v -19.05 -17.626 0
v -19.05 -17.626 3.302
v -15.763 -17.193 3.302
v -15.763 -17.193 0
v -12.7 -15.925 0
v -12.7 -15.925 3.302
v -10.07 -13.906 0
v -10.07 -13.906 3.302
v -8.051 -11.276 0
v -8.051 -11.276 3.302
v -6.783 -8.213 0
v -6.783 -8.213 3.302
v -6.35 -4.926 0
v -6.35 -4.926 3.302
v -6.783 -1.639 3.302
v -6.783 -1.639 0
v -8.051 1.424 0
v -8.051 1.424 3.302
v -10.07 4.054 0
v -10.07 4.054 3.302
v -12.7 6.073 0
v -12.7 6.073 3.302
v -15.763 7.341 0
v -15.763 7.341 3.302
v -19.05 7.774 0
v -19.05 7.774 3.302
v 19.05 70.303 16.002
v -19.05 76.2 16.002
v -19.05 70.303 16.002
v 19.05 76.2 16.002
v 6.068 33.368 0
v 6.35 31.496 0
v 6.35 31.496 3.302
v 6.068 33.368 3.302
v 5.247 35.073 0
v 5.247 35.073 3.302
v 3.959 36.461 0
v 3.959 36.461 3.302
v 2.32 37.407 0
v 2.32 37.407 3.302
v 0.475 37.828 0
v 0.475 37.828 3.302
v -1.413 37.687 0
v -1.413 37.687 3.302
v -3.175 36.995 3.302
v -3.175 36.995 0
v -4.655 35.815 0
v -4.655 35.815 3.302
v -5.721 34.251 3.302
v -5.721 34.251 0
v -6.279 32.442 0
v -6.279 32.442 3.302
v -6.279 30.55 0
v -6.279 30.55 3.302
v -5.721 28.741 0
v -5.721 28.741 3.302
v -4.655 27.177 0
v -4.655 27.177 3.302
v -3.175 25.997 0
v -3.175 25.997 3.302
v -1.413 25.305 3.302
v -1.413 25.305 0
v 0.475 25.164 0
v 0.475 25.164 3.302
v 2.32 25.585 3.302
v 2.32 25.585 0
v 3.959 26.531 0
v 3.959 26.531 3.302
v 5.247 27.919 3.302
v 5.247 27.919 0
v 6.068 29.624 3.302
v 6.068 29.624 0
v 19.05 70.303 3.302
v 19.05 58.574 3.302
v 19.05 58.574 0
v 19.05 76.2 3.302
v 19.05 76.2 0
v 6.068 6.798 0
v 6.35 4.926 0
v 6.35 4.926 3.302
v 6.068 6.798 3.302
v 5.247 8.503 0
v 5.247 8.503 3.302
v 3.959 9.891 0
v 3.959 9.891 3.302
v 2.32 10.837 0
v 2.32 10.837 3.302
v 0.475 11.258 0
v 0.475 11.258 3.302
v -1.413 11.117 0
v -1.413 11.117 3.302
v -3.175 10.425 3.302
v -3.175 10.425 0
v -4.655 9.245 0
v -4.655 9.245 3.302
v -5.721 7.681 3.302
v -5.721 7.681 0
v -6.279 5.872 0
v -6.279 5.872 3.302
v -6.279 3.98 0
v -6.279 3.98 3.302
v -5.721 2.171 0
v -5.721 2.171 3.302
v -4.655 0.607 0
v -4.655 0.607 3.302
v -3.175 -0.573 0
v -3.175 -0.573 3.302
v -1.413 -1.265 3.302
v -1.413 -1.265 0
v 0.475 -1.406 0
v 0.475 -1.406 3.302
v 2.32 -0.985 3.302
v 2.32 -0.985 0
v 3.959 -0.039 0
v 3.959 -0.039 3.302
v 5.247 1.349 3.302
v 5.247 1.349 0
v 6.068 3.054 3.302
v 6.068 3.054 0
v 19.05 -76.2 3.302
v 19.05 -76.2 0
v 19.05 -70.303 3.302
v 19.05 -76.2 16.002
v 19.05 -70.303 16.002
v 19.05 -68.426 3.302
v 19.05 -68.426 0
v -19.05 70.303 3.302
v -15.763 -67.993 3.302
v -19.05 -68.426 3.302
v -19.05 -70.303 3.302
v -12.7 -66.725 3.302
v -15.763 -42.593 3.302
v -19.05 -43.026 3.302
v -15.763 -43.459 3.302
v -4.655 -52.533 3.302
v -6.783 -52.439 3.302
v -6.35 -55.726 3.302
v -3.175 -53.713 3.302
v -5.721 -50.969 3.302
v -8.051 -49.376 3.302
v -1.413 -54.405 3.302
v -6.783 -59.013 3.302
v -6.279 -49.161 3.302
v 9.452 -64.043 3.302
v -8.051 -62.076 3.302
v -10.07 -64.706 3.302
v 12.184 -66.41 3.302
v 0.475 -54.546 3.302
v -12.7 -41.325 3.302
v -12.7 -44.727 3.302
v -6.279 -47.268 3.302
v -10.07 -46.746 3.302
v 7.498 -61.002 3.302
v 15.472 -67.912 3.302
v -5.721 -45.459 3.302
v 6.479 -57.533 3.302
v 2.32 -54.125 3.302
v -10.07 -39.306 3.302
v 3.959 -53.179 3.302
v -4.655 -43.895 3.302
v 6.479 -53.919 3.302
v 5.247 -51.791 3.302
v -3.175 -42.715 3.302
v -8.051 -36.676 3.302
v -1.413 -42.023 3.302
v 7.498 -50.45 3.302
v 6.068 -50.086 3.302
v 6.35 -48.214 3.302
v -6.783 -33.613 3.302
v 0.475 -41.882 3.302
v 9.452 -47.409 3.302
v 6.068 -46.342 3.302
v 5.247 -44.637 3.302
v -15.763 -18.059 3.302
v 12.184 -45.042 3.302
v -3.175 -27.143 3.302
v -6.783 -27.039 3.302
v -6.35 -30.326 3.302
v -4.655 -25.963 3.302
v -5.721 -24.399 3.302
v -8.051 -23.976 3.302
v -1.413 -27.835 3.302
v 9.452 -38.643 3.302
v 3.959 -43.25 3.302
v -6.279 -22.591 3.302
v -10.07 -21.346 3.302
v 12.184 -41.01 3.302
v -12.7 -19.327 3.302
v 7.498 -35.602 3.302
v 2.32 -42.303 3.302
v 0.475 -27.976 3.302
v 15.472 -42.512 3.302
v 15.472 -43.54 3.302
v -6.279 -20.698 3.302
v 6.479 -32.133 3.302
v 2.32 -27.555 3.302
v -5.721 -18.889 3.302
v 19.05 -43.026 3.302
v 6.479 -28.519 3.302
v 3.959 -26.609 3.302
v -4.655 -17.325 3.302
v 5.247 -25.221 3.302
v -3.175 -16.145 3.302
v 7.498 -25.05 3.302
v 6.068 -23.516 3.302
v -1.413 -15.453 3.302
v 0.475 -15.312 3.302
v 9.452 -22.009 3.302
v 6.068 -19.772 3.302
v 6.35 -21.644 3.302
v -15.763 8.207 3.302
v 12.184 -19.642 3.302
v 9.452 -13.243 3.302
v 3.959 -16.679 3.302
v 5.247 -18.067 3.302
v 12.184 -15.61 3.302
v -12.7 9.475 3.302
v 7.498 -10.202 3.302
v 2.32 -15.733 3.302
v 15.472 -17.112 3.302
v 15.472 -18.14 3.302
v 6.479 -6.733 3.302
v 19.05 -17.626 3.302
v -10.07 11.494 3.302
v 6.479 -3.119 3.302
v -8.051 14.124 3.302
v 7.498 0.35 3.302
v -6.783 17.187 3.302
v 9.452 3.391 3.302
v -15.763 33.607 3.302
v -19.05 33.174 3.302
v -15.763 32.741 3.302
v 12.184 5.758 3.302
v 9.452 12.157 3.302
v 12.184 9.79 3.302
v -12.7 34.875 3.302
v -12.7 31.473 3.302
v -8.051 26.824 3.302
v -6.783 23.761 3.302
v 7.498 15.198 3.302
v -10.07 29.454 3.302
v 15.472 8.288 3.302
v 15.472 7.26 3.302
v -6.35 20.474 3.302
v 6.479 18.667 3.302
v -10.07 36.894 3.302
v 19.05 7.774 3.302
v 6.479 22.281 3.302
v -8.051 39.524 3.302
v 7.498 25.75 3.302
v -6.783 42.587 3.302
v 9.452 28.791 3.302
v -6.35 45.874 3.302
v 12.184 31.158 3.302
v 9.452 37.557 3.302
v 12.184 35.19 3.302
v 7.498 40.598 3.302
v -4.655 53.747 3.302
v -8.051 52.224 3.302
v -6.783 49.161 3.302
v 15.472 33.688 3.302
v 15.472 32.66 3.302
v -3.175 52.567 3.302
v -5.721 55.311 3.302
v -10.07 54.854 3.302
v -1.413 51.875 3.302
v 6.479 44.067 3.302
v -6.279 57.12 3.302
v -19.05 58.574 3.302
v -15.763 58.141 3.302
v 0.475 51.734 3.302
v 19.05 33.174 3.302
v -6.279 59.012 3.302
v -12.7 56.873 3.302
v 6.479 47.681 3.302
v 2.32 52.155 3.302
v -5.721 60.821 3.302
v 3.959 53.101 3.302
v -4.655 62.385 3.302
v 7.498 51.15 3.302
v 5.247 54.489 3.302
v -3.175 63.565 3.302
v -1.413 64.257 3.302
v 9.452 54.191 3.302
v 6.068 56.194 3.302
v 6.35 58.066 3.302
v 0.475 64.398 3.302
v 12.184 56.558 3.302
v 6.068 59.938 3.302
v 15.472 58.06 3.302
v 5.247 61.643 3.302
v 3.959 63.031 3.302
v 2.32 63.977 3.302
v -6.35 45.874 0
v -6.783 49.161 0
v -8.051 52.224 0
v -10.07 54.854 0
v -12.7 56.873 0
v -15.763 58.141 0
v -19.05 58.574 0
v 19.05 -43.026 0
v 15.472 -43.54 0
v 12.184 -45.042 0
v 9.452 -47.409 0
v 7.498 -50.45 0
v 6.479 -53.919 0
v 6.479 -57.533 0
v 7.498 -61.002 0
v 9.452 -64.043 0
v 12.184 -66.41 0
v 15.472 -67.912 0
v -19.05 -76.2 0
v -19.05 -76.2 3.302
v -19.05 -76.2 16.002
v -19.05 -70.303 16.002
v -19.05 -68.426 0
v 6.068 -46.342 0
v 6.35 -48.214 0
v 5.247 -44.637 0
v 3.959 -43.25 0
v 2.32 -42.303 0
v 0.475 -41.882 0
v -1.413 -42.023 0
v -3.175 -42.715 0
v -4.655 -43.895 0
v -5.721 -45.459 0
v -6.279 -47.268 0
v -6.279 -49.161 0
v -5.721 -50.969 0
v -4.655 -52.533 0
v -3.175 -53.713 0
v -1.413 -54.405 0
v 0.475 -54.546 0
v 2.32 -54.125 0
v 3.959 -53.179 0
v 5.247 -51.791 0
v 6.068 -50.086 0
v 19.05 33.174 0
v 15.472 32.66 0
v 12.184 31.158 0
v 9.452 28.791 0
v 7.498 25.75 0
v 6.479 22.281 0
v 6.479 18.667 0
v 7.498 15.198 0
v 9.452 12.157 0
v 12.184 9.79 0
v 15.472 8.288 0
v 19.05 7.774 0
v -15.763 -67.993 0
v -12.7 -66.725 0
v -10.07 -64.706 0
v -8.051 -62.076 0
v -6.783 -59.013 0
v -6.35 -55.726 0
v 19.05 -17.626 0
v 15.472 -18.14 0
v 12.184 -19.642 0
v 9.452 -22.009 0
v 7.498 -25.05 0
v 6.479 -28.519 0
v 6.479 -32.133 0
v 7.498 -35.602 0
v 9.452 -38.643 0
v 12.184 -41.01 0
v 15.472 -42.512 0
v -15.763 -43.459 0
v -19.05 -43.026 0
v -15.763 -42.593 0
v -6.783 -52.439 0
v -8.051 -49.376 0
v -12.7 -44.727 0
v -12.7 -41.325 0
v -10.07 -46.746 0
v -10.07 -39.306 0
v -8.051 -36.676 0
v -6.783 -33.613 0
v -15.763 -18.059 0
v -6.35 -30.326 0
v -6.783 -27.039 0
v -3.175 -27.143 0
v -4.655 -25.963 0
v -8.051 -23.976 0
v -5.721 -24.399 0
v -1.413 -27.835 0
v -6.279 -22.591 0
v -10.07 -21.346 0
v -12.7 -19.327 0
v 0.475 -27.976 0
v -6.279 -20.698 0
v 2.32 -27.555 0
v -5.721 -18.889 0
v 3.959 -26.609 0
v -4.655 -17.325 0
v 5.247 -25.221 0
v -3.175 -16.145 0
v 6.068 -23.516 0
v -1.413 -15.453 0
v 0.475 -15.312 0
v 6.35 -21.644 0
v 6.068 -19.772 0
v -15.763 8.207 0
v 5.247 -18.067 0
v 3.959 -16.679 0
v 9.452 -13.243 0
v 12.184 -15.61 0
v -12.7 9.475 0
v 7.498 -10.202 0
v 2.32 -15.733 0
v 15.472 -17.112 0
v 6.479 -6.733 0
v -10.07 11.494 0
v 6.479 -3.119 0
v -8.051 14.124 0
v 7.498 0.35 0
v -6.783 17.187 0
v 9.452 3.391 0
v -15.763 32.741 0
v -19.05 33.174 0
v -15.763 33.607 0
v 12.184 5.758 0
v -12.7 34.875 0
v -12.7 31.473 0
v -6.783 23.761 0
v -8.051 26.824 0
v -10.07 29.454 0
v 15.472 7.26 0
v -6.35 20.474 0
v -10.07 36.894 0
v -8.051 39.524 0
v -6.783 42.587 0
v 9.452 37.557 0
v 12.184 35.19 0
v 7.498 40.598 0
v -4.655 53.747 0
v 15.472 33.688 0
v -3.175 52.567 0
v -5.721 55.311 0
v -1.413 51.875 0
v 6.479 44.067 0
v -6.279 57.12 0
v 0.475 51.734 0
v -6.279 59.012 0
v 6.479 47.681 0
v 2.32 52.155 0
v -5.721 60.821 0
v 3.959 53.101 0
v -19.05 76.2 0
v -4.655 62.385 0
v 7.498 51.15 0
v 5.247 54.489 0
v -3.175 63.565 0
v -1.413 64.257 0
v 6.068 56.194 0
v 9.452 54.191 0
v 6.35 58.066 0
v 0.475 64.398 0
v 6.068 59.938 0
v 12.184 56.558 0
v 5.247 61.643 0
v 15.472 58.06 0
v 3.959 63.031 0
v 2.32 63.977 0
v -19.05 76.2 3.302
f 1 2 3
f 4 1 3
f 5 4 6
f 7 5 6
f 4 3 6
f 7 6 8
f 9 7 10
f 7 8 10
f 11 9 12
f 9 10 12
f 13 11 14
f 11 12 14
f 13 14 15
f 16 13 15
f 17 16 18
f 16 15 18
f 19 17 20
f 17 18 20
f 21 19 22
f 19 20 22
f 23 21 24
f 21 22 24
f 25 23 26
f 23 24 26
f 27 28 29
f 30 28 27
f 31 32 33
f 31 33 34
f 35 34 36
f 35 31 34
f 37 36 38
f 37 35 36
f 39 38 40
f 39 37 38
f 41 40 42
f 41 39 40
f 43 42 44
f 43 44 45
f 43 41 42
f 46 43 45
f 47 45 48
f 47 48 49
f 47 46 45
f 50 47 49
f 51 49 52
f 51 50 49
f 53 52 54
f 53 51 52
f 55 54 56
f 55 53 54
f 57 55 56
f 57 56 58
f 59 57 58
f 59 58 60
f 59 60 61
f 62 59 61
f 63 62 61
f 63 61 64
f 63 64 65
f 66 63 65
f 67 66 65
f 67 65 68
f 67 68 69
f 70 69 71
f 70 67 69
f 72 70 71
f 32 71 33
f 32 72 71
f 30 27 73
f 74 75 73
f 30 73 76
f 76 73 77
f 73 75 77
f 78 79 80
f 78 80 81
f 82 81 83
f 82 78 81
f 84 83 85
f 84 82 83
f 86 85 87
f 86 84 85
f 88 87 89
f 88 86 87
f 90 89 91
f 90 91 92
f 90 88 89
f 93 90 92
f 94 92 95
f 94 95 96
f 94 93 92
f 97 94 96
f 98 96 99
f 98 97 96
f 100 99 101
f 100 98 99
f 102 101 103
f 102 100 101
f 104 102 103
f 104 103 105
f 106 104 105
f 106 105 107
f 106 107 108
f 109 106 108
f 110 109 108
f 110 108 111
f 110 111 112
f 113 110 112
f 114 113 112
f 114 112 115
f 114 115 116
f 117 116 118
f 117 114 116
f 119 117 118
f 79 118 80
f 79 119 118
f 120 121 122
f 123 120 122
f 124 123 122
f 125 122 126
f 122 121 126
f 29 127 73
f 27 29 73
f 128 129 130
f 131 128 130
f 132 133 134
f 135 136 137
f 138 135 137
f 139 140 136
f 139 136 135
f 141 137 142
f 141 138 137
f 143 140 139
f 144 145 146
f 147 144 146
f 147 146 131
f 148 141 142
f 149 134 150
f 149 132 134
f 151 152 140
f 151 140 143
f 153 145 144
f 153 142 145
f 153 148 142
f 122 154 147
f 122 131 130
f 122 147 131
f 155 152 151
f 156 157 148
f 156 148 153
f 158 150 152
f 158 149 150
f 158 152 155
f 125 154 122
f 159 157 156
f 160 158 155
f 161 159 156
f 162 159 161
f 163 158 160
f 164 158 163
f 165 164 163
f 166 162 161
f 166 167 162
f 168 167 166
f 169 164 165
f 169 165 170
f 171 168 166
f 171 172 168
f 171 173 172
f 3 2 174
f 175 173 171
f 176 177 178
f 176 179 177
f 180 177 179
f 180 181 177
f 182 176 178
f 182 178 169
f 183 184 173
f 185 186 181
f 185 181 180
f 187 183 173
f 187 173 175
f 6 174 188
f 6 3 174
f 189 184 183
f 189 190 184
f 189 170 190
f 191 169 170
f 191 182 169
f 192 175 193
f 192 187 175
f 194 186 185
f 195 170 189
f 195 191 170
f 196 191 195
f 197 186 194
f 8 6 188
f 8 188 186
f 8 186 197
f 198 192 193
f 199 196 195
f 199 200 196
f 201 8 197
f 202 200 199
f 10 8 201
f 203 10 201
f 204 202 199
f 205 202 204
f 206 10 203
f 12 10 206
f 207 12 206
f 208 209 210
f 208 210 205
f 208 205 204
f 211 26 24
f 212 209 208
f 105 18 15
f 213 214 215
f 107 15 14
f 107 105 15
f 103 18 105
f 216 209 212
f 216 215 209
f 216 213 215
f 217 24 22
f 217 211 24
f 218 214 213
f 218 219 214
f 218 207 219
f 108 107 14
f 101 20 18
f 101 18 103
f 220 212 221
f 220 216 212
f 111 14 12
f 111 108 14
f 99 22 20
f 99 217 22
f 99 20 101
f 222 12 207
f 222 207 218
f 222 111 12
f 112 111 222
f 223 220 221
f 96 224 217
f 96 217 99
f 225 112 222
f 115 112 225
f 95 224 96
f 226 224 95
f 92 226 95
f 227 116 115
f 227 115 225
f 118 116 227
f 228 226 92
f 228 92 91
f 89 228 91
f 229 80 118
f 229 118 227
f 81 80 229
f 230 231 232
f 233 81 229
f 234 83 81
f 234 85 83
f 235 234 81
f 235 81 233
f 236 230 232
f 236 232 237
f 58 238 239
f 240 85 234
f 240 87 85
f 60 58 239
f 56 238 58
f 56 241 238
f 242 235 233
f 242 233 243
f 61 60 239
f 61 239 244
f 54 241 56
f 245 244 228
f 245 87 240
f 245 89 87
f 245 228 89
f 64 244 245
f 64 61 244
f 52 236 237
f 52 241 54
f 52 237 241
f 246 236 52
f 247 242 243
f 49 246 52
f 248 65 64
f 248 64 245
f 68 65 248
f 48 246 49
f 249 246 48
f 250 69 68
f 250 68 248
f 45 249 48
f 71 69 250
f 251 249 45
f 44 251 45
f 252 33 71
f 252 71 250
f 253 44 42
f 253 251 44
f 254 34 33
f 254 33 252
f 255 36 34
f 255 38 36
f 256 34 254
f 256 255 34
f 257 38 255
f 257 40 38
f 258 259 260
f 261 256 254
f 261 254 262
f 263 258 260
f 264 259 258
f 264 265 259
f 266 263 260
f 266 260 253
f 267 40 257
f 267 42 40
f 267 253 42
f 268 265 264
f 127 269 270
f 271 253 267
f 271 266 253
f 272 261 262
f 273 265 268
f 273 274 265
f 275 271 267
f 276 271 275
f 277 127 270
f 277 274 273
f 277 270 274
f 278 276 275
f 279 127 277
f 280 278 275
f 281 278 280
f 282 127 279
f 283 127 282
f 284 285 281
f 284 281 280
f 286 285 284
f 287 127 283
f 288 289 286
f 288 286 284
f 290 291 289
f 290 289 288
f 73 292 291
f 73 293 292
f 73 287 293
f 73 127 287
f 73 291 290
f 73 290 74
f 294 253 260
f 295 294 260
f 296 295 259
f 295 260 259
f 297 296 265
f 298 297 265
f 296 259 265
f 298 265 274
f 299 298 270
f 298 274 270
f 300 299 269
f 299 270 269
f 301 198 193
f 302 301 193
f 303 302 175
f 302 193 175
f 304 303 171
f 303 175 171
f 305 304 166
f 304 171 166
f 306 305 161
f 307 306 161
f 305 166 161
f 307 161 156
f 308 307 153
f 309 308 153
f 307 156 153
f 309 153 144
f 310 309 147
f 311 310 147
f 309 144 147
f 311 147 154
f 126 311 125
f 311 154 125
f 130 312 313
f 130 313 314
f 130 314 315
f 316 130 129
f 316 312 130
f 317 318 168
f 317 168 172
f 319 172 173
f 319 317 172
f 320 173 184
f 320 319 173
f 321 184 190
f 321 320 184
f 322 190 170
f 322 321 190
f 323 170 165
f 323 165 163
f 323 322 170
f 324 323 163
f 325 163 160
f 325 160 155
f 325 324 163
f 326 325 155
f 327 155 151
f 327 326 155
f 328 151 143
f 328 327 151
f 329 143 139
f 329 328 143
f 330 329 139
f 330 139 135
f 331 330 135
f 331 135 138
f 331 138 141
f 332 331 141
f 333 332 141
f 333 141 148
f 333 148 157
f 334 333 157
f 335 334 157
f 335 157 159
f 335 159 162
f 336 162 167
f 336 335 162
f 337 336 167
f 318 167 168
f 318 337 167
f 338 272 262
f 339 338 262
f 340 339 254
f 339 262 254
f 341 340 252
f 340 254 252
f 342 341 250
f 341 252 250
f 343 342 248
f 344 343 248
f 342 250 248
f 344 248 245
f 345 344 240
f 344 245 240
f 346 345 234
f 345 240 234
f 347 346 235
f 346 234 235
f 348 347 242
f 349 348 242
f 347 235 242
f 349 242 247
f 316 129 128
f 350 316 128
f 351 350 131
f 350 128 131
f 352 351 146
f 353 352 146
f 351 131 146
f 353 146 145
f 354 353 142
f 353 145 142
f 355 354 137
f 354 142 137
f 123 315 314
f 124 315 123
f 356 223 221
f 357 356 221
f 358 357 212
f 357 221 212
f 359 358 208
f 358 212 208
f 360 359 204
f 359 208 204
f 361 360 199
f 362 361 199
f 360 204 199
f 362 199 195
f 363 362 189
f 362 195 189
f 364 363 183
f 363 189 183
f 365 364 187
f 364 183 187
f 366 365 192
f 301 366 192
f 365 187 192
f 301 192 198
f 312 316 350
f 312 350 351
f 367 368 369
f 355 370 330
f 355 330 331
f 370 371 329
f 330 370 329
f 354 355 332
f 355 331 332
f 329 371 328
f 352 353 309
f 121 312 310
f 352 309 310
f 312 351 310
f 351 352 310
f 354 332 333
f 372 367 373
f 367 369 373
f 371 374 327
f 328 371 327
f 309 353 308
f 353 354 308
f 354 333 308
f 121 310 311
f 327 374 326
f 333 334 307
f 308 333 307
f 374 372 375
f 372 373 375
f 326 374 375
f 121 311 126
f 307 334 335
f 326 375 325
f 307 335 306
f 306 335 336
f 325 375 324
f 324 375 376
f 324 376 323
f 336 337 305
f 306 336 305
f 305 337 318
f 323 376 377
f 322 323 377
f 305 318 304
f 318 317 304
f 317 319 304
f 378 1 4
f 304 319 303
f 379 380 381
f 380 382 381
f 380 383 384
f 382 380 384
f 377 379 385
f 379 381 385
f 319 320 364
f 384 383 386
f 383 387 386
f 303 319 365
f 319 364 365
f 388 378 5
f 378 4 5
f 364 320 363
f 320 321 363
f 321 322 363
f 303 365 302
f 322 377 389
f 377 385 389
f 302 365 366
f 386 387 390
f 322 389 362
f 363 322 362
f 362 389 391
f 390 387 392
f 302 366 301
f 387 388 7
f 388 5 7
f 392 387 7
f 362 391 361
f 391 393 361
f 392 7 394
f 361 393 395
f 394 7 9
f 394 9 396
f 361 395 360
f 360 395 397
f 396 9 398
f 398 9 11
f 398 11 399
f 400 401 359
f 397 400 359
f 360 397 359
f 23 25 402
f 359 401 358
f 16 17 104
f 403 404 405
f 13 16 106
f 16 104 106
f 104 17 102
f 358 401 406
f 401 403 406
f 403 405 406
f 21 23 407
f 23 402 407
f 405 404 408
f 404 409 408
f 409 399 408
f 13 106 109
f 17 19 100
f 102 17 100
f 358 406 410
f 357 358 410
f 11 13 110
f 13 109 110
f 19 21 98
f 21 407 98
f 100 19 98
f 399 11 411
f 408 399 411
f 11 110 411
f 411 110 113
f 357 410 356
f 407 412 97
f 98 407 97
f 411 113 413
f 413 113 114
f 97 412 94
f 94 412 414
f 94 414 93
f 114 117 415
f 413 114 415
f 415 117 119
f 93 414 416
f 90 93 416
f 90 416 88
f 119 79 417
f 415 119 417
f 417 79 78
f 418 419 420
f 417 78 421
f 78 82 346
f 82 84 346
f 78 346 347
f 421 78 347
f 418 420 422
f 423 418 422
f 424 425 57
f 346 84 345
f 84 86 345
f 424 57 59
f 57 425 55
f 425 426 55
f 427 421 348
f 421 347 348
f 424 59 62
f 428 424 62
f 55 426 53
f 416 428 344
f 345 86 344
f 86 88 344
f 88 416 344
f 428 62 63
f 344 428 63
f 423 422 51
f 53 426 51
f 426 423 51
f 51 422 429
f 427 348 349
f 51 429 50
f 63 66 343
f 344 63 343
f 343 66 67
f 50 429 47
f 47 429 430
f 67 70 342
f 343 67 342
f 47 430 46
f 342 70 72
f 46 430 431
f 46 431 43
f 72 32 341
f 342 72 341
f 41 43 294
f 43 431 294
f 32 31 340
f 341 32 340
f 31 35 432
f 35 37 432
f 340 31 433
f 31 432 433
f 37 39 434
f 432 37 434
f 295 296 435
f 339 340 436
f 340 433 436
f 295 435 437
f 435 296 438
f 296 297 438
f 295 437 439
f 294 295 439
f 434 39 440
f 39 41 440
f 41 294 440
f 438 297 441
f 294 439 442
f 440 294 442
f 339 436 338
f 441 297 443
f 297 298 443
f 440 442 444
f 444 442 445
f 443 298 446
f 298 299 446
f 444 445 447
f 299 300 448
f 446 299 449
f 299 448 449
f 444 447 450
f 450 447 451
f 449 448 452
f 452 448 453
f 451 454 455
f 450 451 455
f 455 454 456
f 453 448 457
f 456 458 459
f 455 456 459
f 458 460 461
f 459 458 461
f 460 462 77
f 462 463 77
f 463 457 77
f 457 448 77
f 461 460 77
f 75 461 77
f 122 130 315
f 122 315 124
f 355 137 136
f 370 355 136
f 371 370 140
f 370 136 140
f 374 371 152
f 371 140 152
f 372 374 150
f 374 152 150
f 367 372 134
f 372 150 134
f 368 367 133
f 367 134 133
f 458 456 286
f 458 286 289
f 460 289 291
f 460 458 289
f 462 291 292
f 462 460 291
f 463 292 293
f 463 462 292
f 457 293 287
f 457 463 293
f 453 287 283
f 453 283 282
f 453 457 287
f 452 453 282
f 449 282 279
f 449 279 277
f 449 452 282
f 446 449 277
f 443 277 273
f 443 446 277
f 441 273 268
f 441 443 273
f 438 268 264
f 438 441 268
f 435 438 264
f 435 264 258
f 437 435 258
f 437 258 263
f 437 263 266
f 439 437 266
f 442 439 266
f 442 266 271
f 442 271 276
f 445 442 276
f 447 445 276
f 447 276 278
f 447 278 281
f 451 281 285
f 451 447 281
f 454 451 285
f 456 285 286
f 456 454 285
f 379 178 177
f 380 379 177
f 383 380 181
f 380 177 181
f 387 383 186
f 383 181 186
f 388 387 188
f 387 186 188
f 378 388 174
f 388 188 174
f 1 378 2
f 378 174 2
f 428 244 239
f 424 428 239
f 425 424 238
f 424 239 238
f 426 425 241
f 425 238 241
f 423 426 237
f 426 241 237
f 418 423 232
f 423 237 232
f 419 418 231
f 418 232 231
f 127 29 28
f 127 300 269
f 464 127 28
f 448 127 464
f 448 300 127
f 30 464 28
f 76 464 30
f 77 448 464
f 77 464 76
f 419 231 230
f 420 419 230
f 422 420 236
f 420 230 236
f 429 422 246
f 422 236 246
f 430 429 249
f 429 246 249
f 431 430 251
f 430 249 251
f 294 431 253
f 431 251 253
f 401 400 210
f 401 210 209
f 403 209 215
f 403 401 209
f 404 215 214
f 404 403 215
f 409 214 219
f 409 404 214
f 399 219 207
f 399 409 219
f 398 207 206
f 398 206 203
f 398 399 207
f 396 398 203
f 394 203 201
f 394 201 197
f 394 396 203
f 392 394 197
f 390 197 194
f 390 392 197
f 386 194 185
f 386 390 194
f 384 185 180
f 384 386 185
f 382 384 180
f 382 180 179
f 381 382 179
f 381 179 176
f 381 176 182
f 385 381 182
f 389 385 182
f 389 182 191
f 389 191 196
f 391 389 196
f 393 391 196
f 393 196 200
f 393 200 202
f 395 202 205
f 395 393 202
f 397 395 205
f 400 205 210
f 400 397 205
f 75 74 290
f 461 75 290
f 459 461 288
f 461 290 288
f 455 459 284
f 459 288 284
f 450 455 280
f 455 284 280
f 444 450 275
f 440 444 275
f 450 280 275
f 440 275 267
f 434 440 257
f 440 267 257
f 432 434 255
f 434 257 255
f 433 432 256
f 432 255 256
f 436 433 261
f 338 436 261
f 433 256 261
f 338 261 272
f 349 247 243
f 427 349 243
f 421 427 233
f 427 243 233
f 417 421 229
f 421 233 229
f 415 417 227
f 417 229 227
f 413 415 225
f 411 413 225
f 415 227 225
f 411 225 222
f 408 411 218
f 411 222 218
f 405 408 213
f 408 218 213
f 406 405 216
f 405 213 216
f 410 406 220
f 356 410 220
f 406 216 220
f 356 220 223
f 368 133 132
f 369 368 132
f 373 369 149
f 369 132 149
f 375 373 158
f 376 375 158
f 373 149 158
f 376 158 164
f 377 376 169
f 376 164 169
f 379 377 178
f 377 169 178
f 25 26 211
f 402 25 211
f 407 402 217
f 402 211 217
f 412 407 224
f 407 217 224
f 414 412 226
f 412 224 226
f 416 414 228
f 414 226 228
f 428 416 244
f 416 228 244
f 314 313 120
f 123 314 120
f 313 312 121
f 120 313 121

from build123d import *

# Parameters (mm, degrees)
F0_W     = 38.1
F0_H     = 152.4
F0_R     = 6.35
F1_DEPTH = 3.302
F2_W     = 38.1
F2_H     = 5.8965822577
F3_DEPTH = 12.7
F5_DEPTH = 25.4


with BuildPart() as f1:
    # F0 (on Top) → F1 (new body)
    with BuildSketch(Plane.XY):
        Rectangle(F0_W, F0_H)
        with Locations((0, -48.2141543601)):
            Circle(F0_R, mode=Mode.SUBTRACT)
        with Locations((0, -21.6441029067)):
            Circle(F0_R, mode=Mode.SUBTRACT)
        with Locations((0, 4.9259485466)):
            Circle(F0_R, mode=Mode.SUBTRACT)
        with Locations((0, 31.496)):
            Circle(F0_R, mode=Mode.SUBTRACT)
        with Locations((0, 58.0660514534)):
            Circle(F0_R, mode=Mode.SUBTRACT)
    extrude(amount=F1_DEPTH)

    # F2 (on face) → F3 (join)
    with BuildSketch(Plane.XY.offset(3.302)):
        with Locations((0, 73.2517088711)):
            Rectangle(F2_W, F2_H)
        with Locations((0, -73.2517088711)):
            Rectangle(F2_W, F2_H)
    extrude(amount=F3_DEPTH)

    # F4 (on face) → F5 (cut)
    with BuildSketch(Plane.XY.offset(3.302)):
        with BuildLine():
            ThreePointArc((-19.05, 33.1740033209), (-10.0697438789, 36.8937471999), (-6.35, 45.8740033209))
            ThreePointArc((-6.35, 45.8740033209), (-10.0697438789, 54.854259442), (-19.05, 58.5740033209))
            Line((-19.05, 58.5740033209), (-19.05, 33.1740033209))
        make_face()
        with BuildLine():
            ThreePointArc((-6.35, 20.4740033209), (-10.0697438789, 29.454259442), (-19.05, 33.1740033209))
            Line((-19.05, 33.1740033209), (-19.05, 7.7740033209))
            ThreePointArc((-19.05, 7.7740033209), (-10.0697438789, 11.4937471999), (-6.35, 20.4740033209))
        make_face()
        with BuildLine():
            ThreePointArc((-6.35, -4.9259966791), (-10.0697438789, 4.054259442), (-19.05, 7.7740033209))
            Line((-19.05, 7.7740033209), (-19.05, -17.6259966791))
            ThreePointArc((-19.05, -17.6259966791), (-10.0697438789, -13.9062528001), (-6.35, -4.9259966791))
        make_face()
        with BuildLine():
            ThreePointArc((-6.35, -30.3259966791), (-10.0697438789, -21.345740558), (-19.05, -17.6259966791))
            Line((-19.05, -17.6259966791), (-19.05, -43.0259966791))
            ThreePointArc((-19.05, -43.0259966791), (-10.0697438789, -39.3062528001), (-6.35, -30.3259966791))
        make_face()
        with BuildLine():
            Line((19.05, 33.1740033209), (19.05, 58.5740033209))
            ThreePointArc((19.05, 58.5740033209), (6.35, 45.8740033209), (19.05, 33.1740033209))
        make_face()
        with BuildLine():
            ThreePointArc((-6.35, -55.7259966791), (-10.0697438789, -46.745740558), (-19.05, -43.0259966791))
            Line((-19.05, -43.0259966791), (-19.05, -68.4259966791))
            ThreePointArc((-19.05, -68.4259966791), (-10.0697438789, -64.7062528001), (-6.35, -55.7259966791))
        make_face()
        with BuildLine():
            Line((19.05, 7.7740033209), (19.05, 33.1740033209))
            ThreePointArc((19.05, 33.1740033209), (6.35, 20.4740033209), (19.05, 7.7740033209))
        make_face()
        with BuildLine():
            Line((19.05, -17.6259966791), (19.05, 7.7740033209))
            ThreePointArc((19.05, 7.7740033209), (6.35, -4.9259966791), (19.05, -17.6259966791))
        make_face()
        with BuildLine():
            Line((19.05, -43.0259966791), (19.05, -17.6259966791))
            ThreePointArc((19.05, -17.6259966791), (6.35, -30.3259966791), (19.05, -43.0259966791))
        make_face()
        with BuildLine():
            Line((19.05, -68.4259966791), (19.05, -43.0259966791))
            ThreePointArc((19.05, -43.0259966791), (6.35, -55.7259966791), (19.05, -68.4259966791))
        make_face()
    extrude(amount=-F5_DEPTH, mode=Mode.SUBTRACT)


solid = f1.part
